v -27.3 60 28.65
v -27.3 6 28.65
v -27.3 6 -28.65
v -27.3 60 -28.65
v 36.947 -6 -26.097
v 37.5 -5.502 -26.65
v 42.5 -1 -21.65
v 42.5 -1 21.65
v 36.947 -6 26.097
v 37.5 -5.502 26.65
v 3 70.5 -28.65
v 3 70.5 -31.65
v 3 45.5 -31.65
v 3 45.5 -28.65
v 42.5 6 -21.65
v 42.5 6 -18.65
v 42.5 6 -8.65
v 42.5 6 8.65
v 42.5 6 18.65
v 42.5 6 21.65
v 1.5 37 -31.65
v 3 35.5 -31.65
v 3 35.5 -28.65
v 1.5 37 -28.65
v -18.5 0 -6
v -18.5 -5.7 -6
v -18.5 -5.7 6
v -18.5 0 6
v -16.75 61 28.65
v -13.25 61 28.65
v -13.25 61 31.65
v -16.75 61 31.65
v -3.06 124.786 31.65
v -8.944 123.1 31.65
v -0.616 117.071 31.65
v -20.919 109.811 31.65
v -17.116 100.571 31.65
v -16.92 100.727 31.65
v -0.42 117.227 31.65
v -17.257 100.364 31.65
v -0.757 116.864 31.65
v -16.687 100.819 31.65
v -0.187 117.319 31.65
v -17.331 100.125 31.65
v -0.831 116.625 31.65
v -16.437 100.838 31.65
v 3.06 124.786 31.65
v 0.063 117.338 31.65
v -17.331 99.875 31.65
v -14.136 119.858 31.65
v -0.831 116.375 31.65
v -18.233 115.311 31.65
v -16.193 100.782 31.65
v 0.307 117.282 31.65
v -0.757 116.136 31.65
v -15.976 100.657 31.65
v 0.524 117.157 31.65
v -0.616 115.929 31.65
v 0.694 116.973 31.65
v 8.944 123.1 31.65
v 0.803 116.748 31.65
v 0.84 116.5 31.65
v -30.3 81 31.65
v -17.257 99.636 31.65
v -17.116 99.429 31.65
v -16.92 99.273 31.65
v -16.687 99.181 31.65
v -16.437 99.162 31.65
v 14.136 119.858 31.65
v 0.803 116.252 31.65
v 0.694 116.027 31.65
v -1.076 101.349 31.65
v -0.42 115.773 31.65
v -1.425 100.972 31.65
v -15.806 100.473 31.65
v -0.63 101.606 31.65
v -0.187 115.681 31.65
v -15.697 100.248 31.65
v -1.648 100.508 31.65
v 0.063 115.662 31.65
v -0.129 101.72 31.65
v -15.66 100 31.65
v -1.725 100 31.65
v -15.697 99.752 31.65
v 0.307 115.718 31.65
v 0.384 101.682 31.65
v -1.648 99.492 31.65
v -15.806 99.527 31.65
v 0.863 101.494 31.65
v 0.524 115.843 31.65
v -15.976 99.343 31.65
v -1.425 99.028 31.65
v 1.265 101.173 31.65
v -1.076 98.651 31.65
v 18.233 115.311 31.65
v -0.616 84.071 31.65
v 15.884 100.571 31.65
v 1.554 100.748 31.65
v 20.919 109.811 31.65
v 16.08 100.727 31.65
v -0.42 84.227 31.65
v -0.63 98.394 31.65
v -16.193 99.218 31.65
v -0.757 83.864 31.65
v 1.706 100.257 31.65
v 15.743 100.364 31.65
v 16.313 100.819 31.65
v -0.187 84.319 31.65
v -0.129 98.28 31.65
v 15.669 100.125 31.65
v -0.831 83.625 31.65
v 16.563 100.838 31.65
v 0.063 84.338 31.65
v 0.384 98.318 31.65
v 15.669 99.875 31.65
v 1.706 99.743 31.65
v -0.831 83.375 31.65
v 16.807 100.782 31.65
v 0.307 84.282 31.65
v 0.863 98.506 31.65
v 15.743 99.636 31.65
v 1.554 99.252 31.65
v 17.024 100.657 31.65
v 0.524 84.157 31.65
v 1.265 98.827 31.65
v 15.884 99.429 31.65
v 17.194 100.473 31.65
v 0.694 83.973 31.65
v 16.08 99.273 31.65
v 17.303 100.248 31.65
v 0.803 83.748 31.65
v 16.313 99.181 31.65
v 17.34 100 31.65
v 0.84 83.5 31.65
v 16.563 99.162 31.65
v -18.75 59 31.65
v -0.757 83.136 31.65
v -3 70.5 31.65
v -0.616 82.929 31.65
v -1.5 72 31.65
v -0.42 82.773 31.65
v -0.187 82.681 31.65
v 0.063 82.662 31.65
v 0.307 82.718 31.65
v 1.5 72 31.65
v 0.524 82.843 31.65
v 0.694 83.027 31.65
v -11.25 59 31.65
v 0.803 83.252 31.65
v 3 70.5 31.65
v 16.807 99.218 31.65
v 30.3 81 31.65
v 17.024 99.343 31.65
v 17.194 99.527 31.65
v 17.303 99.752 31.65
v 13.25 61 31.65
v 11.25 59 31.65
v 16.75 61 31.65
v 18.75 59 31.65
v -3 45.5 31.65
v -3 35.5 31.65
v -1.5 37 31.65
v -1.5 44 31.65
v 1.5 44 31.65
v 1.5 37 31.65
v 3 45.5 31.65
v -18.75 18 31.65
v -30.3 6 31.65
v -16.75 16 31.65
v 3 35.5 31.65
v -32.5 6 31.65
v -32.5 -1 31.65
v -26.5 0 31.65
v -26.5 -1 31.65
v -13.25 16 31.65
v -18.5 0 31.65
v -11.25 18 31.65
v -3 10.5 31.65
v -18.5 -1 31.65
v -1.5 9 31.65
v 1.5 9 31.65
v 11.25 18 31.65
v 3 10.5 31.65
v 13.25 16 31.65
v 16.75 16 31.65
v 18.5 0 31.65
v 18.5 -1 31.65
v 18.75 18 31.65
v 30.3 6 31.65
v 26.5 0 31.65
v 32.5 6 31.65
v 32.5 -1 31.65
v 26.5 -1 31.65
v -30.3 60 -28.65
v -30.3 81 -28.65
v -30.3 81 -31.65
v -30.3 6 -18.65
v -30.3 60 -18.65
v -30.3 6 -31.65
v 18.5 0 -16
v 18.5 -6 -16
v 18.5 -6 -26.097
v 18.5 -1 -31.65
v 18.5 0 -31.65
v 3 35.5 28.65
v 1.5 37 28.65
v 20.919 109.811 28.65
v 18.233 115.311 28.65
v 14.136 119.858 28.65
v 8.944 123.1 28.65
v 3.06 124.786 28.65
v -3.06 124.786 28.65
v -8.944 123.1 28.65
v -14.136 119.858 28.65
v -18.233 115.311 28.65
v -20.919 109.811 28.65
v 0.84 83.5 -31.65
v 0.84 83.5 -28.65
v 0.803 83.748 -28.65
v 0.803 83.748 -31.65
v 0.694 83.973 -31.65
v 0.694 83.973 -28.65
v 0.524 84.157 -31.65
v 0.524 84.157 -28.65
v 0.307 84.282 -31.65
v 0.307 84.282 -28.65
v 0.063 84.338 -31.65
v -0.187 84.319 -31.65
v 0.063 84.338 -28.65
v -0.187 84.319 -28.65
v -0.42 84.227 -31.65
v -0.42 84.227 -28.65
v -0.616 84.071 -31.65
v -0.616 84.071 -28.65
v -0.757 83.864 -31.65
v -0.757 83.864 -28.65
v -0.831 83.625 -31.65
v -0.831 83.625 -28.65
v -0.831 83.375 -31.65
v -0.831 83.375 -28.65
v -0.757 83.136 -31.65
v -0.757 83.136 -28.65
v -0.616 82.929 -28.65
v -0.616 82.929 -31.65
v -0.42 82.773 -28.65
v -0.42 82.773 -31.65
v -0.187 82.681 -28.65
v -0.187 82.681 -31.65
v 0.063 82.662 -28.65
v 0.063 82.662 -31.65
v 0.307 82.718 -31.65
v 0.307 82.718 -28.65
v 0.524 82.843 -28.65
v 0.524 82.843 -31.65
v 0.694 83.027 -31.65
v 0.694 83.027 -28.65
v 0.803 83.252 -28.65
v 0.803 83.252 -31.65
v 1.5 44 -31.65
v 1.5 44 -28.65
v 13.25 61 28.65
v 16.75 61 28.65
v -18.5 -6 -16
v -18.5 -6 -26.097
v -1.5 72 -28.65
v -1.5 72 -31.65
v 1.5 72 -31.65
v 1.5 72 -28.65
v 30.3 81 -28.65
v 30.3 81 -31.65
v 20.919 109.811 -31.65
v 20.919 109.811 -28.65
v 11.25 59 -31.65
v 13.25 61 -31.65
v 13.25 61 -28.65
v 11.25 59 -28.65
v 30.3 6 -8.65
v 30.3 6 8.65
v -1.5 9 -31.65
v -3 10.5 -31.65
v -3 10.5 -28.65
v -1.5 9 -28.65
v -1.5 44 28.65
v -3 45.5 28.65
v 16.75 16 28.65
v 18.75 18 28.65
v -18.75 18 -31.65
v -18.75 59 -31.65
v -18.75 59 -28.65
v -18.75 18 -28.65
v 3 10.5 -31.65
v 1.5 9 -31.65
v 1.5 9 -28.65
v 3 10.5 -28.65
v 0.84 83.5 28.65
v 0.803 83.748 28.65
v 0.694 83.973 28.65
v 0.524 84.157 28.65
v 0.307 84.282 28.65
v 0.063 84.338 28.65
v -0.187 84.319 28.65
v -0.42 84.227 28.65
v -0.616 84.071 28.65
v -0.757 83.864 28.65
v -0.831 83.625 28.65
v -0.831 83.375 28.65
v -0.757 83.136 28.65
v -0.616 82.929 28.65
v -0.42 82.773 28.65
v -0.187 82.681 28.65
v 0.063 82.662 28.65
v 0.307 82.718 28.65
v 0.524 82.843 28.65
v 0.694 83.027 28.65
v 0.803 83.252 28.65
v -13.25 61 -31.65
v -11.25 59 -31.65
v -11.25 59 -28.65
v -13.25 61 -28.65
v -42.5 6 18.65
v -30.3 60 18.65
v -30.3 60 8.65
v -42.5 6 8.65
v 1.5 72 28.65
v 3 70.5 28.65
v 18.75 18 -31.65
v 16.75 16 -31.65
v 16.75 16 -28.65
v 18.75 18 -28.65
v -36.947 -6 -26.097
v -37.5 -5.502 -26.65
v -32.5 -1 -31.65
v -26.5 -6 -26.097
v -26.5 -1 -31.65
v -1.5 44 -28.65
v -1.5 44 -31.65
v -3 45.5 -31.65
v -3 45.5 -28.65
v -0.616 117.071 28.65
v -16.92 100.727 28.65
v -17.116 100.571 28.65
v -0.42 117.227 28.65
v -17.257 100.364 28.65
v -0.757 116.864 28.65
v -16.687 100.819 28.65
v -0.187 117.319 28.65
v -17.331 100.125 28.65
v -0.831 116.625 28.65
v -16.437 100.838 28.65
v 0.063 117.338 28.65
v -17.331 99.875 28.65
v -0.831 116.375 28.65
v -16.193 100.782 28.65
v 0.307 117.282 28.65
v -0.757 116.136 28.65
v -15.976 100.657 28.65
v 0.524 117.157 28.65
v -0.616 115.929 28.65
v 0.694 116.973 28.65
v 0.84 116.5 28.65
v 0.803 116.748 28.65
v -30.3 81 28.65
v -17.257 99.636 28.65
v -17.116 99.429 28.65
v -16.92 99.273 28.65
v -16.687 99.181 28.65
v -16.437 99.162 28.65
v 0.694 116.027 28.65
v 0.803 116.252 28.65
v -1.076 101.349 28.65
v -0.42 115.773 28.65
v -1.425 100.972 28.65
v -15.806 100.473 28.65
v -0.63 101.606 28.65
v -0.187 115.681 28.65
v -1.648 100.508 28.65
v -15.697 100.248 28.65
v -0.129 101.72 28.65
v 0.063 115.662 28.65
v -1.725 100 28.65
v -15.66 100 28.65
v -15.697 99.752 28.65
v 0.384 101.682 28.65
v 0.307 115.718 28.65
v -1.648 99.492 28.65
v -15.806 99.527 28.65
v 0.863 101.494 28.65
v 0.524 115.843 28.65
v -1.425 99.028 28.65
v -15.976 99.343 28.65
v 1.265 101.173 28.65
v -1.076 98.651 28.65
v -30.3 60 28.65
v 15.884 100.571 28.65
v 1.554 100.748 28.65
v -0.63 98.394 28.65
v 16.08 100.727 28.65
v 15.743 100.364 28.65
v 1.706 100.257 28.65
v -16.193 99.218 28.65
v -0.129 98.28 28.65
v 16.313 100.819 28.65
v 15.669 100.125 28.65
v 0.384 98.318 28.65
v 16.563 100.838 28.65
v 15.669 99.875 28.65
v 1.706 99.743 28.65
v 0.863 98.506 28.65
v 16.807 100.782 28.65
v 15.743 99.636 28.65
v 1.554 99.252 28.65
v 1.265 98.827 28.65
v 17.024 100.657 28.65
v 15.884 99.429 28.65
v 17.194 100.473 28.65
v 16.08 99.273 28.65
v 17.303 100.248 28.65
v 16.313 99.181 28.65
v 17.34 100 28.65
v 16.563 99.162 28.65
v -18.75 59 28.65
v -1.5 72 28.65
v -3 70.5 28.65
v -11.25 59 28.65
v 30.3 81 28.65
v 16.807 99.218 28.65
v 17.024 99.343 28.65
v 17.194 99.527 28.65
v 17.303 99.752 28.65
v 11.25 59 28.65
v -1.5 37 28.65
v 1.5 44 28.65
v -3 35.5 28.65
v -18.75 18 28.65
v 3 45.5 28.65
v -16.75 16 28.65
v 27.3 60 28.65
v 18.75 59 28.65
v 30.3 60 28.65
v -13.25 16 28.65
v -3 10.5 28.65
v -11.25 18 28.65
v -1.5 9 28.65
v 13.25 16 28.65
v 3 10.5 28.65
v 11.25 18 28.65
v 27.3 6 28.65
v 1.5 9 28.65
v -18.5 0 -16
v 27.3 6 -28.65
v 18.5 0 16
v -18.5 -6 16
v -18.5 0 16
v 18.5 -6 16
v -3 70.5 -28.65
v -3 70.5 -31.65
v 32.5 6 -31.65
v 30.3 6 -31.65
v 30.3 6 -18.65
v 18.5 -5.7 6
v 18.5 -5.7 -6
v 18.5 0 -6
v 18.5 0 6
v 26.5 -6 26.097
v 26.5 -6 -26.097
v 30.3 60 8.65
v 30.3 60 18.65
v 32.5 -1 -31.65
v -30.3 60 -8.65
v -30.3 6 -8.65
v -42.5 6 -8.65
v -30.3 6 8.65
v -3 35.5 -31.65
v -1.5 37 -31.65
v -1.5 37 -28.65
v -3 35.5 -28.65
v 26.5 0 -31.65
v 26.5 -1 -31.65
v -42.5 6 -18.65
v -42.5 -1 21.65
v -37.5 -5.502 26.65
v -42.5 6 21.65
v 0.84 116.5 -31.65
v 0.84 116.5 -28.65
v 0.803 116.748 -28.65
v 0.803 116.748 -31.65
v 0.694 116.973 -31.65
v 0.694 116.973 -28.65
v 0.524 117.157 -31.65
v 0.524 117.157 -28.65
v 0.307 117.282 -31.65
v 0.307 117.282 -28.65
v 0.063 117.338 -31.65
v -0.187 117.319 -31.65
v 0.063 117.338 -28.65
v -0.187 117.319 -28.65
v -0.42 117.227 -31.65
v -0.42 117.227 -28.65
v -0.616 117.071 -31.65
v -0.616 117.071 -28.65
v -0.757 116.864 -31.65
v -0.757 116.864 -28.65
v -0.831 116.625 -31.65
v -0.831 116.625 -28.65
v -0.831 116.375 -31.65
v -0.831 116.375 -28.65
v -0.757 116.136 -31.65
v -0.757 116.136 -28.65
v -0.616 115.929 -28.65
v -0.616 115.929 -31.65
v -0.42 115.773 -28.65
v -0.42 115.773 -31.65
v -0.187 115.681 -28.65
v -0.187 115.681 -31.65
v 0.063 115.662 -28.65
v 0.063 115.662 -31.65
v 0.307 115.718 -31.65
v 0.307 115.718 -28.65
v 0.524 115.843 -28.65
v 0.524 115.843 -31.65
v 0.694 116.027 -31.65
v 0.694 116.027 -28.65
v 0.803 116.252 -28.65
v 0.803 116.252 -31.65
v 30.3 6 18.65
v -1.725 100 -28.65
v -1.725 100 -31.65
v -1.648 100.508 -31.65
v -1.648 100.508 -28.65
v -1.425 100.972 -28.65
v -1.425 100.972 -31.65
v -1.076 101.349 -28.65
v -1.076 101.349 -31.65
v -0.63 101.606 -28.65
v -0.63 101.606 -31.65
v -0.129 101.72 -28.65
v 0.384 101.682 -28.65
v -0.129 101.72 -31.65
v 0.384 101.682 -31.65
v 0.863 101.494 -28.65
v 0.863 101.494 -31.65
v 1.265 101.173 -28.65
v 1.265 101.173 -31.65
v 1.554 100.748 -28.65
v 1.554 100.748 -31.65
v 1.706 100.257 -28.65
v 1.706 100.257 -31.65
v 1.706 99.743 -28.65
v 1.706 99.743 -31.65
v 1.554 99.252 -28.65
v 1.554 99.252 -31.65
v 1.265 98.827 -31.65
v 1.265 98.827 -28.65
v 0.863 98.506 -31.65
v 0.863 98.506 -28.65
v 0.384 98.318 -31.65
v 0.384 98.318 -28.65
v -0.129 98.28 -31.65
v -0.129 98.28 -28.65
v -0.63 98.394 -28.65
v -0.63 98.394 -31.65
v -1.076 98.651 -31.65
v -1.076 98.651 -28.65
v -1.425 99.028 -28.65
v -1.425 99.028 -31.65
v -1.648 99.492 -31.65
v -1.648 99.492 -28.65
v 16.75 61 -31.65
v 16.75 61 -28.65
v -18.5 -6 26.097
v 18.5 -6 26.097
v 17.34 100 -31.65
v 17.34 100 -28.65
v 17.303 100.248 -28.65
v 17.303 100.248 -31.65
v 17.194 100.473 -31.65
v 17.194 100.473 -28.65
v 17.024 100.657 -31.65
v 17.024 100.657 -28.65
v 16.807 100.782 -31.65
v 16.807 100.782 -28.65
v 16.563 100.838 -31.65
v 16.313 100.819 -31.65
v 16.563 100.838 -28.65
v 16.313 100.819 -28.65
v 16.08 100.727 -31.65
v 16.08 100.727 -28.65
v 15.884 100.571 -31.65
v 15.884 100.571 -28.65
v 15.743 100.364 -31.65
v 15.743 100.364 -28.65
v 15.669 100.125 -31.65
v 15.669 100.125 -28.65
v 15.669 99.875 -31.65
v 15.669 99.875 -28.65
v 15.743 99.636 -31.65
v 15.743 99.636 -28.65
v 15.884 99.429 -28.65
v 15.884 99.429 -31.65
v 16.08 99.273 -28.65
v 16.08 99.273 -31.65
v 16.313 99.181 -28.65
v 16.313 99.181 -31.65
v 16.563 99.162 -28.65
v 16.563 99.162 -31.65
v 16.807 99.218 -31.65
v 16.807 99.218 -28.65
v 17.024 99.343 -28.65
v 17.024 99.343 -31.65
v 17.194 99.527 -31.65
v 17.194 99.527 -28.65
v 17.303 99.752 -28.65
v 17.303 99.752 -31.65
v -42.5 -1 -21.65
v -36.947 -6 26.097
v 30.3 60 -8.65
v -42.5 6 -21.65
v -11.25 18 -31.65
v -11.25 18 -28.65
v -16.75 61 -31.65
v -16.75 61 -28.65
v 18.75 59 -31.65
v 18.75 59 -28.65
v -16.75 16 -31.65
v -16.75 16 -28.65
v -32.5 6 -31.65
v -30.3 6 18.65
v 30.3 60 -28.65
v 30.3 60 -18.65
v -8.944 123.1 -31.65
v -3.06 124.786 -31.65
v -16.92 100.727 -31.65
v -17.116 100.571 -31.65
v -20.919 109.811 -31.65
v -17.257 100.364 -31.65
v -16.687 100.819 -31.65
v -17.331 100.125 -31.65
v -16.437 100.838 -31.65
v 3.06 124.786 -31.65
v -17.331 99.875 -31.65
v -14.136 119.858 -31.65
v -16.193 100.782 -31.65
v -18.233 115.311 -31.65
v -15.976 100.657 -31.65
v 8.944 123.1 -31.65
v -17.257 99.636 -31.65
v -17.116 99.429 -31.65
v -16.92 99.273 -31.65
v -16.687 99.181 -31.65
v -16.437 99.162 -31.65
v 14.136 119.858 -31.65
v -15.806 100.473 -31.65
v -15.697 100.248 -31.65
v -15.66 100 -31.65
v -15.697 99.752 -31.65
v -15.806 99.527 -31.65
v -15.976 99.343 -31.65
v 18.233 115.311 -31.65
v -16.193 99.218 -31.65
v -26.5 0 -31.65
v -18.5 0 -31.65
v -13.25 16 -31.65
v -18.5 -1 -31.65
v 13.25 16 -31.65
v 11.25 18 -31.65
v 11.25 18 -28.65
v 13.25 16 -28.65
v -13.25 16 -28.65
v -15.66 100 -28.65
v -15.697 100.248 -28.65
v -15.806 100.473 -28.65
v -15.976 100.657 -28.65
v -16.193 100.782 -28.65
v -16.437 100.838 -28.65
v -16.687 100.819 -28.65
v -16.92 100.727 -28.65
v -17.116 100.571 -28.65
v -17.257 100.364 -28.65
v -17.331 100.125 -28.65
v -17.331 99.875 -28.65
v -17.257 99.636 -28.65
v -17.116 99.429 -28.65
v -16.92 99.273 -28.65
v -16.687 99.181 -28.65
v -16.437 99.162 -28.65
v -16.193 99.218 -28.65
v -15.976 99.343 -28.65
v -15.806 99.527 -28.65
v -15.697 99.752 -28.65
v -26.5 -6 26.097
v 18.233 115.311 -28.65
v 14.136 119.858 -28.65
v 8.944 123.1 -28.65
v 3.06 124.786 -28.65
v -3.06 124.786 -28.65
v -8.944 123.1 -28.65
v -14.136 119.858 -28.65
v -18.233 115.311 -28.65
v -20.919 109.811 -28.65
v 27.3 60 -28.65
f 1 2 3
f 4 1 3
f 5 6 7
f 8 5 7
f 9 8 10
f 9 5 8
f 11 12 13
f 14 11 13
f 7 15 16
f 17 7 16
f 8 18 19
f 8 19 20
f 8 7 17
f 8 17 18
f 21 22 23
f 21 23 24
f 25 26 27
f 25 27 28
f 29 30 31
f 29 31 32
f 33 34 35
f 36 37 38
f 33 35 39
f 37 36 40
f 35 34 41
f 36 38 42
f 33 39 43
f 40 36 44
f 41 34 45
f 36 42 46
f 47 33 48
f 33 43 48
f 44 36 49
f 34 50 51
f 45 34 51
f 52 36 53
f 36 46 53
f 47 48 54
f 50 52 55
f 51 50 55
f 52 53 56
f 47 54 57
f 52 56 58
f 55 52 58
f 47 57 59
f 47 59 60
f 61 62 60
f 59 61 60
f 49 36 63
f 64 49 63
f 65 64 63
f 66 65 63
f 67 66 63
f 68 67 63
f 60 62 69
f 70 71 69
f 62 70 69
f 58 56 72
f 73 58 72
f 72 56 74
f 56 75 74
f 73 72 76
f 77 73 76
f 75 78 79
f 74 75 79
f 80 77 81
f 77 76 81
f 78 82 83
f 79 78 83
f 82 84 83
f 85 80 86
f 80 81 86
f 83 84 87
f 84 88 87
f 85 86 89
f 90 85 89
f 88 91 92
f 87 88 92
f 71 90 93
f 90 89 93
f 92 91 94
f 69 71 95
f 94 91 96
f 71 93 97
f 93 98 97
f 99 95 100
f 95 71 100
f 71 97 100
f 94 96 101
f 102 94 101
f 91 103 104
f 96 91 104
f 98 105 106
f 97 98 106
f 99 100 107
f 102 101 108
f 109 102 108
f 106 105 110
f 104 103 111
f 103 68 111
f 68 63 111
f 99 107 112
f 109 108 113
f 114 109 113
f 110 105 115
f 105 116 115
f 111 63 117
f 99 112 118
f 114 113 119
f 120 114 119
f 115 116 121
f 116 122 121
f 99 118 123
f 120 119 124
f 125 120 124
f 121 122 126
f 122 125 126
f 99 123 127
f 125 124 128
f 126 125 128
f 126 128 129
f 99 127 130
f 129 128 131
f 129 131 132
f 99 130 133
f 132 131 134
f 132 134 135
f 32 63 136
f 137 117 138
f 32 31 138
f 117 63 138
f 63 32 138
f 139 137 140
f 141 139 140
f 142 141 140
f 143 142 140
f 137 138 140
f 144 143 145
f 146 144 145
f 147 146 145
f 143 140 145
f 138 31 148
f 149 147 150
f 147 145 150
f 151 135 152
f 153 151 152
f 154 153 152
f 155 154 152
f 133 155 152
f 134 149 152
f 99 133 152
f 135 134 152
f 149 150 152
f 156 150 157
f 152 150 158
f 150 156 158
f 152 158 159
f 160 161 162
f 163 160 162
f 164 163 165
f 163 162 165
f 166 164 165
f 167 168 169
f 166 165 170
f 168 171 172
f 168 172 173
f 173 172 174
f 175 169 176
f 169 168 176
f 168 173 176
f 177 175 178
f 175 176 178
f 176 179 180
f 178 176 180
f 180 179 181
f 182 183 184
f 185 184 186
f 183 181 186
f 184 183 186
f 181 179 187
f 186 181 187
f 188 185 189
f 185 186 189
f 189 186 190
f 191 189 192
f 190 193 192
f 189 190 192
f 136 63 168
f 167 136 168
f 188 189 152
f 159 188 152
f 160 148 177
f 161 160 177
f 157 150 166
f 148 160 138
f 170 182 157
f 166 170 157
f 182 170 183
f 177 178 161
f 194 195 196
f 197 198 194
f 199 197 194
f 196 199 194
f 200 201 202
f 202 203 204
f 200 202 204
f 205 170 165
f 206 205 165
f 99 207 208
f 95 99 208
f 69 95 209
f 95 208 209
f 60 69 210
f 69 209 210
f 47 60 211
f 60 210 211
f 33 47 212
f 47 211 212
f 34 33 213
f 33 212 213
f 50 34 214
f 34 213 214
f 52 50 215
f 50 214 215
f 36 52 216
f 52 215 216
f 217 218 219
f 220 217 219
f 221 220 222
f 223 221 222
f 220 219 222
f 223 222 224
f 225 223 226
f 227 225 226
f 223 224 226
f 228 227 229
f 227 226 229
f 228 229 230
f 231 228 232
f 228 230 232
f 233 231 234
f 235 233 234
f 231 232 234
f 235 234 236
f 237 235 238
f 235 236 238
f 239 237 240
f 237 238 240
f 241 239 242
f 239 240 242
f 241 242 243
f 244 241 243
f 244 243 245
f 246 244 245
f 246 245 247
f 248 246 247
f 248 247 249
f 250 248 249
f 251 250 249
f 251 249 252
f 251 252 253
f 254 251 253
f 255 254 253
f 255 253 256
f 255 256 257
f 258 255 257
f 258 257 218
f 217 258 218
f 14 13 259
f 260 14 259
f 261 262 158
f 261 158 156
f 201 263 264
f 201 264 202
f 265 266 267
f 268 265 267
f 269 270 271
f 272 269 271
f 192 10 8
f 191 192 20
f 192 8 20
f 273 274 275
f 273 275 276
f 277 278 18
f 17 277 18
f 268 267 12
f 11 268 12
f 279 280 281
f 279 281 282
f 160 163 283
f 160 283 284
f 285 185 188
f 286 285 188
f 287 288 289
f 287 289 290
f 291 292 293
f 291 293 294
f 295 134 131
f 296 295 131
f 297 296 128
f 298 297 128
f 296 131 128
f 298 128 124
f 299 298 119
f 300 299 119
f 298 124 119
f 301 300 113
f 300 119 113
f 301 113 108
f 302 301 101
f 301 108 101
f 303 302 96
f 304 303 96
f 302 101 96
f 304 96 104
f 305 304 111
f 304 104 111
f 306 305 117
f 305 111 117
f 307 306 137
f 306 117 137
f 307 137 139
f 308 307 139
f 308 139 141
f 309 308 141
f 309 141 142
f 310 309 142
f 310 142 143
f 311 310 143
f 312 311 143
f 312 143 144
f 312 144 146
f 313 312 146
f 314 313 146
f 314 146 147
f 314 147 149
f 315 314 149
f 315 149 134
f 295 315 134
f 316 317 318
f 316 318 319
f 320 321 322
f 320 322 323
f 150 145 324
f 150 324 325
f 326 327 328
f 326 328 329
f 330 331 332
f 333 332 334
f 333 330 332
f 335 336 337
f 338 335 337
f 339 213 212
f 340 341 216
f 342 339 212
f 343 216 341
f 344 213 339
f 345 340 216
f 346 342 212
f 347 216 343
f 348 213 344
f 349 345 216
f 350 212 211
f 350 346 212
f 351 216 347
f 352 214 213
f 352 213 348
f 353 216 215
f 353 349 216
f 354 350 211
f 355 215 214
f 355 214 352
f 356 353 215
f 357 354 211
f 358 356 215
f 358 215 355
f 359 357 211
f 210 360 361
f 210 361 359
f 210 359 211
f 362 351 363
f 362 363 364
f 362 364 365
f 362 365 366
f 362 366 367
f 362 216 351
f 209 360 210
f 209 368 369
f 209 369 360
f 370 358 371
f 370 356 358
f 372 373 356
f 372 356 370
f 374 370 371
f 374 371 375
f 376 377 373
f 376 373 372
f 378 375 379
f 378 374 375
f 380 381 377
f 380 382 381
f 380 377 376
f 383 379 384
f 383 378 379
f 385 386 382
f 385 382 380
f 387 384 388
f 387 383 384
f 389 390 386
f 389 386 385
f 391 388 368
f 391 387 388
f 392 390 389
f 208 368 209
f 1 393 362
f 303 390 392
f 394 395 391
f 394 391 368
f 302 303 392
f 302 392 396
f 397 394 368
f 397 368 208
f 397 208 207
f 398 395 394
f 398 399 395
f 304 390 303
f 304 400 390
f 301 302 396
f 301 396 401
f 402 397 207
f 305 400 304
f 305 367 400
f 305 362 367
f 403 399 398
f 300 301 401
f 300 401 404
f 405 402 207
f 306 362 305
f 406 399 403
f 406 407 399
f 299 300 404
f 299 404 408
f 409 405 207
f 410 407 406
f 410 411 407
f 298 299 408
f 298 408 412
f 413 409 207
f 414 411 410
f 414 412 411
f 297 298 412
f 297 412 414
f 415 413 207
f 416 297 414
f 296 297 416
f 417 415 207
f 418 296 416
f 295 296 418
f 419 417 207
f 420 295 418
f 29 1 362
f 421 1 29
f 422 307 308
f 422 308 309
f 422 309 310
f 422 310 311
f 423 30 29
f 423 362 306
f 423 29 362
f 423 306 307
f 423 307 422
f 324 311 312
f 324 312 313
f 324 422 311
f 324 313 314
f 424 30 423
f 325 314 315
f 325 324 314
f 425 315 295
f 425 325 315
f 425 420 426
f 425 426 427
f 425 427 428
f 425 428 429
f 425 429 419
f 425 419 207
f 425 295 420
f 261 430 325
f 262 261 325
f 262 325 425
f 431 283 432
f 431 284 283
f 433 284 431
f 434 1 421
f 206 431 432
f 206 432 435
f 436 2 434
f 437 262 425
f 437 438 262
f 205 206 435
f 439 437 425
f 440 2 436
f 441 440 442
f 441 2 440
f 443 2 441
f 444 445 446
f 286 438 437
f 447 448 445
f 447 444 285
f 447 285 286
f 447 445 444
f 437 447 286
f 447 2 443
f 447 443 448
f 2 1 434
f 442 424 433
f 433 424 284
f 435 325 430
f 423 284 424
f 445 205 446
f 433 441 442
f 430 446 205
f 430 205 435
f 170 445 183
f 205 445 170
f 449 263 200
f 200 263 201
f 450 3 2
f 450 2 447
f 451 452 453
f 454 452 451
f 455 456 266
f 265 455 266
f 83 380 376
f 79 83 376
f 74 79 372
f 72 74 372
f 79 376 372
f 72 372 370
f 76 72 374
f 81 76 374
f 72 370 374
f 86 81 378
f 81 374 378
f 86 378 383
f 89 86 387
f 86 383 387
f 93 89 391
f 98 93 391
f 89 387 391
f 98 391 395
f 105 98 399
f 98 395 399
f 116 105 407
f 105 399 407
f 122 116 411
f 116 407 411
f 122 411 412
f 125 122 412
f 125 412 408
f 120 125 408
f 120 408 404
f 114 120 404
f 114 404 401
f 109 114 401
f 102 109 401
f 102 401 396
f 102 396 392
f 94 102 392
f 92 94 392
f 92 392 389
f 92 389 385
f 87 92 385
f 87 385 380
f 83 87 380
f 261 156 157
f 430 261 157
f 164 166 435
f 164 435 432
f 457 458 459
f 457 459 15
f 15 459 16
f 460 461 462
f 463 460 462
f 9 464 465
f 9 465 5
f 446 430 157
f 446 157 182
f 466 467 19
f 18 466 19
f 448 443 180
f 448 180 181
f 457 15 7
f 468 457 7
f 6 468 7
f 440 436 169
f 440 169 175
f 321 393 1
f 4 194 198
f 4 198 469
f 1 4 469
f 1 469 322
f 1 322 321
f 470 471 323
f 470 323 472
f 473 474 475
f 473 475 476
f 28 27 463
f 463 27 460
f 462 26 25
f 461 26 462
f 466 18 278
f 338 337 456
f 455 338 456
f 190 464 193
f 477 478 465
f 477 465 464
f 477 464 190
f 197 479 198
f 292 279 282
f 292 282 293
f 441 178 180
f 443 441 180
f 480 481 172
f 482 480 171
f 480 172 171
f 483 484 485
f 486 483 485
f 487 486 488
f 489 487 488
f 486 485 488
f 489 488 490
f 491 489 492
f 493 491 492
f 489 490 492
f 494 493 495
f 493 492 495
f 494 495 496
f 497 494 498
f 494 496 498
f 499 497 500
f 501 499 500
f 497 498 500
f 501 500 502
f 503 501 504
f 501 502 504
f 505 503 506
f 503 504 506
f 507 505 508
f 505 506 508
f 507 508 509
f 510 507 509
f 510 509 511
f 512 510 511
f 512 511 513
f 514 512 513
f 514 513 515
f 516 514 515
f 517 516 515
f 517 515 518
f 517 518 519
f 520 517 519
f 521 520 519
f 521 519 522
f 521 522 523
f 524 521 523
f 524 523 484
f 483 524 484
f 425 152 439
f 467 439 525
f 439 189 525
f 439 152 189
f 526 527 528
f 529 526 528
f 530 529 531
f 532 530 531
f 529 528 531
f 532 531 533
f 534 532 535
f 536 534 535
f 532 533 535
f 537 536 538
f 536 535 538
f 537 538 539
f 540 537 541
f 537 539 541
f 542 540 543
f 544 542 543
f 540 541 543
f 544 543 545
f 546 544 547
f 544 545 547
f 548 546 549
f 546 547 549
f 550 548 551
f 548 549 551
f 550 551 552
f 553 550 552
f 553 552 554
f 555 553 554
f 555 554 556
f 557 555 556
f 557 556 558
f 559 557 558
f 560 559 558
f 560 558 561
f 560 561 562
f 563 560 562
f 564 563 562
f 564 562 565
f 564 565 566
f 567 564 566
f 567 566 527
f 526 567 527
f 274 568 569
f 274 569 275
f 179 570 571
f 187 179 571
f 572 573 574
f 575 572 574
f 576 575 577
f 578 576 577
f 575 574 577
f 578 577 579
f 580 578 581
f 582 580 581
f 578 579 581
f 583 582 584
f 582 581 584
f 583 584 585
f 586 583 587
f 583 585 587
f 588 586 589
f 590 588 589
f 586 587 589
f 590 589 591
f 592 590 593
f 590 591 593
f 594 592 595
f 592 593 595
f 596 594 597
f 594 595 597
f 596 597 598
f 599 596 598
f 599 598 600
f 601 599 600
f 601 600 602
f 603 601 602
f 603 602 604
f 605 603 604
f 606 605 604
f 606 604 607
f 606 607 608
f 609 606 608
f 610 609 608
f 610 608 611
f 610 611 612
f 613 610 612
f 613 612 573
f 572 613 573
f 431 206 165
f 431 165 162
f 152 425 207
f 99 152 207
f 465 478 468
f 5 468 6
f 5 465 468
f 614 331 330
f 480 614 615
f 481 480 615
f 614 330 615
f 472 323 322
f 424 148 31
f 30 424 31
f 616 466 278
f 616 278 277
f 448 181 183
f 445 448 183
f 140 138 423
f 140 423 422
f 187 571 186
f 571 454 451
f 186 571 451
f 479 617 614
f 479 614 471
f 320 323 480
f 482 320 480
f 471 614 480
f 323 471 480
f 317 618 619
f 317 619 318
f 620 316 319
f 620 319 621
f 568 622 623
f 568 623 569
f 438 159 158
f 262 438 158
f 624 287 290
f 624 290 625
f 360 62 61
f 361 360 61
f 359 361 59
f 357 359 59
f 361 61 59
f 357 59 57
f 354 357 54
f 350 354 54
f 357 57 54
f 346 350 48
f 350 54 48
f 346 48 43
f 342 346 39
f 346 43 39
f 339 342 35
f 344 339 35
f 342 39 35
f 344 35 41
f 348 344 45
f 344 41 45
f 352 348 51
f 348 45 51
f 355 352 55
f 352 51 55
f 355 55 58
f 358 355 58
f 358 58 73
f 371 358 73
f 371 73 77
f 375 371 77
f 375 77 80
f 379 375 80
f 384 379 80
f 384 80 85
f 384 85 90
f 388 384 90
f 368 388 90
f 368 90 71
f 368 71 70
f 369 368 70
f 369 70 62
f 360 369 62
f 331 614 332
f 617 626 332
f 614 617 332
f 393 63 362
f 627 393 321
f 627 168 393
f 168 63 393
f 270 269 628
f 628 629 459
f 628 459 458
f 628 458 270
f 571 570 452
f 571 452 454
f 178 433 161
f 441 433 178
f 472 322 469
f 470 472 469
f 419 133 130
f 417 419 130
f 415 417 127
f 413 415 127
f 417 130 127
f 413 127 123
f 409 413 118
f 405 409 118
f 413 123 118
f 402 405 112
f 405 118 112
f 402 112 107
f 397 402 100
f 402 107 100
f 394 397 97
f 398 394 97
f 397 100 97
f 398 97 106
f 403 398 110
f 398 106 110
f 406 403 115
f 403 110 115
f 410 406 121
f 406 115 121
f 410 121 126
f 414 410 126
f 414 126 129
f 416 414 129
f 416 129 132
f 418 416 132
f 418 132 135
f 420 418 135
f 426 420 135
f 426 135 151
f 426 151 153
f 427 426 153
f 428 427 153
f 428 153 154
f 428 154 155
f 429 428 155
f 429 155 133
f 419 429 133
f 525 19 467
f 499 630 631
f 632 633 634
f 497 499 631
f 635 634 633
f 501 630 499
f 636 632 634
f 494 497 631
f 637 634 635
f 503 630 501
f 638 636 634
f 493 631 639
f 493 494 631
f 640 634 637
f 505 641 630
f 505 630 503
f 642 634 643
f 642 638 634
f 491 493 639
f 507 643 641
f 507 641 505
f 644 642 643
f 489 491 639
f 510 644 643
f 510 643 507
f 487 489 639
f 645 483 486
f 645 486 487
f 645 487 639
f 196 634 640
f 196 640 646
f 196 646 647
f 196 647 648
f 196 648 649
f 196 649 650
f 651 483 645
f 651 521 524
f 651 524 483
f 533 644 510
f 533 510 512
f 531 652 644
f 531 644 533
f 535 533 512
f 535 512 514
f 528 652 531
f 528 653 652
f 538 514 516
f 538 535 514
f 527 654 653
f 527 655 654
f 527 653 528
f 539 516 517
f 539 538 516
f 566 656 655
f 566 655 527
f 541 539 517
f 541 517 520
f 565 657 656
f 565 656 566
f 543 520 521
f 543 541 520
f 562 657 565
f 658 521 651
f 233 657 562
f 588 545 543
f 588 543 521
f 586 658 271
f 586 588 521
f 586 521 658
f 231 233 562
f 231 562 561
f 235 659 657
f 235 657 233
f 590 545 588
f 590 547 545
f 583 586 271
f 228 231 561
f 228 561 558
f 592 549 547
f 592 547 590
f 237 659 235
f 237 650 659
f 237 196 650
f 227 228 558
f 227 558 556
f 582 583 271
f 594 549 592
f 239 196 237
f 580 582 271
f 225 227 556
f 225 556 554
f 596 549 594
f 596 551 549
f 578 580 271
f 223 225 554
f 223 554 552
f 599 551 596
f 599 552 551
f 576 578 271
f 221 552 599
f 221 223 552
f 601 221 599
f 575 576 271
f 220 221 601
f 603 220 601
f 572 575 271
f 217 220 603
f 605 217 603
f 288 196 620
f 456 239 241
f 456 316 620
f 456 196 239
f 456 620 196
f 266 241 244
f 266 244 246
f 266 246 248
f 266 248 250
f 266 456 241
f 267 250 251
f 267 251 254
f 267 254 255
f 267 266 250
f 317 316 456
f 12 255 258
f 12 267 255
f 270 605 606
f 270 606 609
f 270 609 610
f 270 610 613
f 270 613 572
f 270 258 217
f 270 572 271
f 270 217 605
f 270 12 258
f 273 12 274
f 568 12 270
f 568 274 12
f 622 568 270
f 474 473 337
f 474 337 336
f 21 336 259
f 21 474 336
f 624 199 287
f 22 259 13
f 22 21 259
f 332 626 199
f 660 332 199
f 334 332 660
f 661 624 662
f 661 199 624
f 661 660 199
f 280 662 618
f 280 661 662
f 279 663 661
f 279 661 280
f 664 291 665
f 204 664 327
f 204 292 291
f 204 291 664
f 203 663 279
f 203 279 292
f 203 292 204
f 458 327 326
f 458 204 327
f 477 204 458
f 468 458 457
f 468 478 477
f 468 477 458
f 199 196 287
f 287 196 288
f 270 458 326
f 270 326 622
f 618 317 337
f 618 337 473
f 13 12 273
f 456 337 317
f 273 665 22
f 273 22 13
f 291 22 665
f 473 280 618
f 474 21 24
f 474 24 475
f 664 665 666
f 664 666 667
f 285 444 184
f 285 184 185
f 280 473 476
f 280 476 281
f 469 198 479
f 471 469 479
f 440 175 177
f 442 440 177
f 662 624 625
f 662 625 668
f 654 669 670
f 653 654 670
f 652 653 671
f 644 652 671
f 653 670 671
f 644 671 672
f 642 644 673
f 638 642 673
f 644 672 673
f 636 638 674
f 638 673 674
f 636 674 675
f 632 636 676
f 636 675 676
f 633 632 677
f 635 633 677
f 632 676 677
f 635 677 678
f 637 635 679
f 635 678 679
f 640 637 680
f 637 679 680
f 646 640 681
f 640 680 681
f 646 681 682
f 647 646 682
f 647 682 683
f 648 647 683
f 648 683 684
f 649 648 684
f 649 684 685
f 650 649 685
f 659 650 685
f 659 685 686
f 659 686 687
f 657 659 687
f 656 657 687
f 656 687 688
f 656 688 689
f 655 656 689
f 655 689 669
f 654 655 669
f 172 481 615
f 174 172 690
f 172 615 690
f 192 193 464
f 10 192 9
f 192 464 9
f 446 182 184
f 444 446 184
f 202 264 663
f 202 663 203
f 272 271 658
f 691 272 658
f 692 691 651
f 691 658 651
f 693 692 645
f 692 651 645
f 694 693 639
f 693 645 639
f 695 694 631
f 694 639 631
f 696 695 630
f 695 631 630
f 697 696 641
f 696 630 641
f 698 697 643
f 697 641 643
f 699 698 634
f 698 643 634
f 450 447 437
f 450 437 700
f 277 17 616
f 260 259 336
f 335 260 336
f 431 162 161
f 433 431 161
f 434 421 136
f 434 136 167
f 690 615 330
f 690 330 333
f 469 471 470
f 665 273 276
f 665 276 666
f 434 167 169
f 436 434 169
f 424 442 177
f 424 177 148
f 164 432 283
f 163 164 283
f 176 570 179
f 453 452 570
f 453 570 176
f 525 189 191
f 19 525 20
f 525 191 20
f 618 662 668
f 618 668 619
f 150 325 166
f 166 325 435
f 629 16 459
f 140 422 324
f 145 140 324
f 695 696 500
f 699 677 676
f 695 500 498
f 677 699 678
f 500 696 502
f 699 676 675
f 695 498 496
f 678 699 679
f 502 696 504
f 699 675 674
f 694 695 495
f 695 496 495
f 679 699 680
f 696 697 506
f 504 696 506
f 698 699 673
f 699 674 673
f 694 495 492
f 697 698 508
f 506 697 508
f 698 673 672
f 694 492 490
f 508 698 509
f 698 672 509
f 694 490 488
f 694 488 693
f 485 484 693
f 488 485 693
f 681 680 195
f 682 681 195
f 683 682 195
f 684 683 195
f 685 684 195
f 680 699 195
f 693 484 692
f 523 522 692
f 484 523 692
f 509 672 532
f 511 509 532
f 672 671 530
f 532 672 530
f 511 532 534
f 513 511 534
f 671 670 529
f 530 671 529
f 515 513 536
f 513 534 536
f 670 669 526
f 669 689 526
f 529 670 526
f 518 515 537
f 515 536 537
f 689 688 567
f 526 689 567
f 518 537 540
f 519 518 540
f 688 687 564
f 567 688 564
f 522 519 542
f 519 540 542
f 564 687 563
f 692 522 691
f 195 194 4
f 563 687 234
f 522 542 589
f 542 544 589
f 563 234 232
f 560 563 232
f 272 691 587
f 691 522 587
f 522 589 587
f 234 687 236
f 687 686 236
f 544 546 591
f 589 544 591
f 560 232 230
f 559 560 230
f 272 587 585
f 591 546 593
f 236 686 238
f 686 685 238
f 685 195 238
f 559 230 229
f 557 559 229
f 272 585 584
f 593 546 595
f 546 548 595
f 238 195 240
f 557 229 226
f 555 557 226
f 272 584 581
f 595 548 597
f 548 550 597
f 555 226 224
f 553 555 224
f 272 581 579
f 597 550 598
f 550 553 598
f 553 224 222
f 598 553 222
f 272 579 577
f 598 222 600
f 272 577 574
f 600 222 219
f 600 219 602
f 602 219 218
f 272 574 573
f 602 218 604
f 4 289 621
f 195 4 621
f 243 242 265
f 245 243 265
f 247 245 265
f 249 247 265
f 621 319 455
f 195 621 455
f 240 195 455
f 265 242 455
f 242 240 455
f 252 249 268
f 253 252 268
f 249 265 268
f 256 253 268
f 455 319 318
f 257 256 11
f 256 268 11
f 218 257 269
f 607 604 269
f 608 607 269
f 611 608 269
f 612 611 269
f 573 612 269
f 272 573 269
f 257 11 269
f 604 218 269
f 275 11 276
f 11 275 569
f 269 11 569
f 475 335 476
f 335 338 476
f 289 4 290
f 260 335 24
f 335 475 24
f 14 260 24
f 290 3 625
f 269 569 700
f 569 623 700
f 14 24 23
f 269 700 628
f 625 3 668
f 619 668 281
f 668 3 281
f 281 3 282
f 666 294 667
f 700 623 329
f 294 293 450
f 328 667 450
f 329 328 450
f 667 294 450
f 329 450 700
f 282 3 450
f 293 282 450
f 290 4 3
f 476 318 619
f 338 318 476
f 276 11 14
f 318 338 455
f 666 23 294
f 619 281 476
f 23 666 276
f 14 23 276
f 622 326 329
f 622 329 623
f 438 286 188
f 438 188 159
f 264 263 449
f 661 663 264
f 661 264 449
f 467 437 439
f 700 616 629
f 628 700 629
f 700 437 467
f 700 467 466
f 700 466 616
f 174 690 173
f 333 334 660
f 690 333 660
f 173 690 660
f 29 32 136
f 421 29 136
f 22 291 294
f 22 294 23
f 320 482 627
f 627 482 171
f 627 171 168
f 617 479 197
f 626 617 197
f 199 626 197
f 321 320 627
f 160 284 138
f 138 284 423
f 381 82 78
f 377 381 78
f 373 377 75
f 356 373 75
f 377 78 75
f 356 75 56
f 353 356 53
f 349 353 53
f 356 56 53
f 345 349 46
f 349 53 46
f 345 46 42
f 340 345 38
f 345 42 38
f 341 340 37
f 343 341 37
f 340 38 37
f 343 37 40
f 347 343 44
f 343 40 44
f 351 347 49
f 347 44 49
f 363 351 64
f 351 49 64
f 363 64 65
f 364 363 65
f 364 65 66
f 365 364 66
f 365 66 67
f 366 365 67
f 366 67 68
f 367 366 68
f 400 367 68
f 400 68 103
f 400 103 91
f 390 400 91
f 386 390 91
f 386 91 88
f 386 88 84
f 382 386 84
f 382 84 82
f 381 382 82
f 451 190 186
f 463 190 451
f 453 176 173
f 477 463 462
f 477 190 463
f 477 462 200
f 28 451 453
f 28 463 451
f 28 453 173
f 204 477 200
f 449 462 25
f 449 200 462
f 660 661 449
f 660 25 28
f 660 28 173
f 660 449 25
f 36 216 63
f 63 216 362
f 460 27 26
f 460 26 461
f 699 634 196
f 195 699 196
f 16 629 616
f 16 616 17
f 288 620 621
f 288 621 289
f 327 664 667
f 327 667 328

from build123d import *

# Parameters (mm, degrees)
SKETCH_1_W             = 60.6
SKETCH_1_H             = 63.3
SKETCH_1_W_2           = 54.6
SKETCH_1_H_2           = 57.3
EXTRUDE_1_DEPTH        = 60
SKETCH_2_W             = 60.6
SKETCH_2_H             = 3
EXTRUDE_2_DEPTH        = 65
CUT_EXTRUDE_1_DEPTH    = 65
SKETCH_9_R             = 1.725
CUT_EXTRUDE_4_DEPTH    = 80
SKETCH_10_W            = 85
SKETCH_10_H            = 63.3
EXTRUDE_3_DEPTH        = 6
CHAMFER_1_SIZE         = 10
CHAMFER_2_SIZE         = 5
CHAMFER_2_SIZE2        = 5.553062574
CHAMFER_2_PART_2_SIZE  = 5
CHAMFER_2_PART_2_SIZE2 = 5.553062574
CHAMFER_2_PART_3_SIZE  = 5
CHAMFER_2_PART_3_SIZE2 = 5.553062574
CHAMFER_2_PART_4_SIZE  = 5
CHAMFER_2_PART_4_SIZE2 = 5.553062574
SKETCH_12_W            = 8
SKETCH_12_H            = 6
CUT_EXTRUDE_5_DEPTH    = 80
SKETCH_13_W            = 37
SKETCH_13_H            = 10
CUT_EXTRUDE_7_DEPTH    = 6
SKETCH_14_W            = 37
SKETCH_14_H            = 12
CUT_EXTRUDE_8_DEPTH    = 0.3
EXTRUDE_4_DEPTH        = 5
MIRROR_2_COPY_1_DEPTH  = 5
SKETCH_8_R             = 0.84
CUT_EXTRUDE_9_DEPTH    = 80
CUT_EXTRUDE_10_DEPTH   = 80


with BuildPart() as part:
    # 草图1 → 凸台-拉伸1 (new body)
    with BuildSketch(Plane(origin=(0, 0, 0), x_dir=(1, 0, 0), z_dir=(0, 1, 0))):
        Rectangle(SKETCH_1_W, SKETCH_1_H)
        Rectangle(SKETCH_1_W_2, SKETCH_1_H_2, mode=Mode.SUBTRACT)
    extrude(amount=EXTRUDE_1_DEPTH)

    # 草图2 → 凸台-拉伸2 (add)
    with BuildSketch(Plane(origin=(0, 60, 0), x_dir=(1, 0, 0), z_dir=(0, 1, 0))):
        with Locations((0, 30.15)):
            Rectangle(SKETCH_2_W, SKETCH_2_H)
        with Locations((0, -30.15)):
            Rectangle(SKETCH_2_W, SKETCH_2_H)
    extrude(amount=EXTRUDE_2_DEPTH)

    # 草图3 → 切除-拉伸1 (cut)
    with BuildSketch(Plane(origin=(0, 0, -31.65), x_dir=(-1, 0, 0), z_dir=(0, 0, -1))):
        with BuildLine():
            Line((-30.3, 81), (-20.919056551, 109.811246068))
            ThreePointArc((-20.919056551, 109.811246068), (0, 125), (20.919056551, 109.811246068))
            Line((20.919056551, 109.811246068), (30.3, 81))
            Line((30.3, 81), (30.3, 183))
            Line((30.3, 183), (-30.3, 125))
            Line((-30.3, 125), (-30.3, 81))
        make_face()
    extrude(amount=-CUT_EXTRUDE_1_DEPTH, mode=Mode.SUBTRACT)

    # 草图9 → 切除-拉伸4 (cut)
    with BuildSketch(Plane(origin=(0, 0, -31.65), x_dir=(-1, 0, 0), z_dir=(0, 0, -1))):
        with Locations((0, 100)):
            Circle(SKETCH_9_R)
    extrude(amount=-CUT_EXTRUDE_4_DEPTH, mode=Mode.SUBTRACT)

    # 草图10 → 凸台-拉伸3 (add, symmetric)
    with BuildSketch(Plane.XZ):
        Rectangle(SKETCH_10_W, SKETCH_10_H)
    extrude(amount=EXTRUDE_3_DEPTH, both=True)

    # 倒角1
    chamfer_1_edges = [part.edges().sort_by_distance(p)[0] for p in [
        (42.5, 0, 31.65),
        (-42.5, 0, -31.65),
        (42.5, 0, -31.65),
        (-42.5, 0, 31.65),
    ]]
    chamfer(chamfer_1_edges, length=CHAMFER_1_SIZE)

    # 倒角2
    chamfer_2_edges = [part.edges().sort_by_distance(p)[0] for p in [
        (42.5, -6, 0),
    ]]
    chamfer_2_side = [part.faces().sort_by_distance(p)[0] for p in [
        (42.5, 0, 0),
    ]]
    chamfer(chamfer_2_edges, length=CHAMFER_2_SIZE, length2=CHAMFER_2_SIZE2, reference=chamfer_2_side[0])

    # 倒角2 part 2
    chamfer_2_part_2_edges = [part.edges().sort_by_distance(p)[0] for p in [
        (-42.5, -6, 0),
    ]]
    chamfer_2_part_2_side = [part.faces().sort_by_distance(p)[0] for p in [
        (-42.5, 0, 0),
    ]]
    chamfer(chamfer_2_part_2_edges, length=CHAMFER_2_PART_2_SIZE, length2=CHAMFER_2_PART_2_SIZE2, reference=chamfer_2_part_2_side[0])

    # 倒角2 part 3
    chamfer_2_part_3_edges = [part.edges().sort_by_distance(p)[0] for p in [
        (0, -6, -31.65),
    ]]
    chamfer_2_part_3_side = [part.faces().sort_by_distance(p)[0] for p in [
        (0, 53.785060823, -31.65),
    ]]
    chamfer(chamfer_2_part_3_edges, length=CHAMFER_2_PART_3_SIZE, length2=CHAMFER_2_PART_3_SIZE2, reference=chamfer_2_part_3_side[0])

    # 倒角2 part 4
    chamfer_2_part_4_edges = [part.edges().sort_by_distance(p)[0] for p in [
        (0, -6, 31.65),
    ]]
    chamfer_2_part_4_side = [part.faces().sort_by_distance(p)[0] for p in [
        (0, 53.785060823, 31.65),
    ]]
    chamfer(chamfer_2_part_4_edges, length=CHAMFER_2_PART_4_SIZE, length2=CHAMFER_2_PART_4_SIZE2, reference=chamfer_2_part_4_side[0])

    # 草图12 → 切除-拉伸5 (cut)
    with BuildSketch(Plane(origin=(0, 0, -31.65), x_dir=(-1, 0, 0), z_dir=(0, 0, -1))):
        with Locations((-22.5, -3)):
            Rectangle(SKETCH_12_W, SKETCH_12_H)
        with Locations((22.5, -3)):
            Rectangle(SKETCH_12_W, SKETCH_12_H)
    extrude(amount=-CUT_EXTRUDE_5_DEPTH, mode=Mode.SUBTRACT)

    # 草图13 → 切除-拉伸7 (cut)
    with BuildSketch(Plane.XZ.offset(6)):
        with Locations((0, 11)):
            Rectangle(SKETCH_13_W, SKETCH_13_H)
        with Locations((0, -11)):
            Rectangle(SKETCH_13_W, SKETCH_13_H)
    extrude(amount=-CUT_EXTRUDE_7_DEPTH, mode=Mode.SUBTRACT)

    # 草图14 → 切除-拉伸8 (cut)
    with BuildSketch(Plane.XZ.offset(6)):
        Rectangle(SKETCH_14_W, SKETCH_14_H)
    extrude(amount=-CUT_EXTRUDE_8_DEPTH, mode=Mode.SUBTRACT)

    # 草图18 → 凸台-拉伸4 (add, symmetric)
    with BuildSketch(Plane(origin=(0, 0, -13.65), x_dir=(-1, 0, 0), z_dir=(0, 0, -1))):
        Polygon((30.3, 60), (42.5, 6), (30.3, 6), align=None)
    extrude_4 = extrude(amount=EXTRUDE_4_DEPTH, both=True)

    # 镜向1: 凸台-拉伸4 across plane
    add(extrude_4.mirror(Plane.XY))

    # 镜向2: 凸台-拉伸4 across plane
    add(extrude_4.mirror(Plane(origin=(0, 0, 0), x_dir=(0, 0, 1), z_dir=(1, 0, 0))))

    # 镜向2 copy 1 sketch → 镜向2 copy 1 (add, symmetric)
    with BuildSketch(Plane.XY.offset(13.65)):
        Polygon((30.3, 60), (42.5, 6), (30.3, 6), align=None)
    extrude(amount=MIRROR_2_COPY_1_DEPTH, both=True)

    # 草图8 → 切除-拉伸9 (cut)
    with BuildSketch(Plane.XY.offset(31.65)):
        with Locations((0, 116.5)):
            Circle(SKETCH_8_R)
        with Locations((16.5, 100)):
            Circle(SKETCH_8_R)
        with Locations((0, 83.5)):
            Circle(SKETCH_8_R)
        with Locations((-16.5, 100)):
            Circle(SKETCH_8_R)
    extrude(amount=-CUT_EXTRUDE_9_DEPTH, mode=Mode.SUBTRACT)

    # 草图19 → 切除-拉伸10 (cut)
    with BuildSketch(Plane(origin=(0, 0, -31.65), x_dir=(-1, 0, 0), z_dir=(0, 0, -1))):
        Polygon((-1.5, 44), (1.5, 44), (3, 45.5), (3, 70.5), (1.5, 72), (-1.5, 72), (-3, 70.5), (-3, 45.5), align=None)
        Polygon((-16.75, 61), (-13.25, 61), (-11.25, 59), (-11.25, 18), (-13.25, 16), (-16.75, 16), (-18.75, 18), (-18.75, 59), align=None)
        Polygon((-3, 10.5), (-3, 35.5), (-1.5, 37), (1.5, 37), (3, 35.5), (3, 10.5), (1.5, 9), (-1.5, 9), align=None)
        Polygon((13.25, 16), (11.25, 18), (11.25, 59), (13.25, 61), (16.75, 61), (18.75, 59), (18.75, 18), (16.75, 16), align=None)
    extrude(amount=-CUT_EXTRUDE_10_DEPTH, mode=Mode.SUBTRACT)


solid = part.part
